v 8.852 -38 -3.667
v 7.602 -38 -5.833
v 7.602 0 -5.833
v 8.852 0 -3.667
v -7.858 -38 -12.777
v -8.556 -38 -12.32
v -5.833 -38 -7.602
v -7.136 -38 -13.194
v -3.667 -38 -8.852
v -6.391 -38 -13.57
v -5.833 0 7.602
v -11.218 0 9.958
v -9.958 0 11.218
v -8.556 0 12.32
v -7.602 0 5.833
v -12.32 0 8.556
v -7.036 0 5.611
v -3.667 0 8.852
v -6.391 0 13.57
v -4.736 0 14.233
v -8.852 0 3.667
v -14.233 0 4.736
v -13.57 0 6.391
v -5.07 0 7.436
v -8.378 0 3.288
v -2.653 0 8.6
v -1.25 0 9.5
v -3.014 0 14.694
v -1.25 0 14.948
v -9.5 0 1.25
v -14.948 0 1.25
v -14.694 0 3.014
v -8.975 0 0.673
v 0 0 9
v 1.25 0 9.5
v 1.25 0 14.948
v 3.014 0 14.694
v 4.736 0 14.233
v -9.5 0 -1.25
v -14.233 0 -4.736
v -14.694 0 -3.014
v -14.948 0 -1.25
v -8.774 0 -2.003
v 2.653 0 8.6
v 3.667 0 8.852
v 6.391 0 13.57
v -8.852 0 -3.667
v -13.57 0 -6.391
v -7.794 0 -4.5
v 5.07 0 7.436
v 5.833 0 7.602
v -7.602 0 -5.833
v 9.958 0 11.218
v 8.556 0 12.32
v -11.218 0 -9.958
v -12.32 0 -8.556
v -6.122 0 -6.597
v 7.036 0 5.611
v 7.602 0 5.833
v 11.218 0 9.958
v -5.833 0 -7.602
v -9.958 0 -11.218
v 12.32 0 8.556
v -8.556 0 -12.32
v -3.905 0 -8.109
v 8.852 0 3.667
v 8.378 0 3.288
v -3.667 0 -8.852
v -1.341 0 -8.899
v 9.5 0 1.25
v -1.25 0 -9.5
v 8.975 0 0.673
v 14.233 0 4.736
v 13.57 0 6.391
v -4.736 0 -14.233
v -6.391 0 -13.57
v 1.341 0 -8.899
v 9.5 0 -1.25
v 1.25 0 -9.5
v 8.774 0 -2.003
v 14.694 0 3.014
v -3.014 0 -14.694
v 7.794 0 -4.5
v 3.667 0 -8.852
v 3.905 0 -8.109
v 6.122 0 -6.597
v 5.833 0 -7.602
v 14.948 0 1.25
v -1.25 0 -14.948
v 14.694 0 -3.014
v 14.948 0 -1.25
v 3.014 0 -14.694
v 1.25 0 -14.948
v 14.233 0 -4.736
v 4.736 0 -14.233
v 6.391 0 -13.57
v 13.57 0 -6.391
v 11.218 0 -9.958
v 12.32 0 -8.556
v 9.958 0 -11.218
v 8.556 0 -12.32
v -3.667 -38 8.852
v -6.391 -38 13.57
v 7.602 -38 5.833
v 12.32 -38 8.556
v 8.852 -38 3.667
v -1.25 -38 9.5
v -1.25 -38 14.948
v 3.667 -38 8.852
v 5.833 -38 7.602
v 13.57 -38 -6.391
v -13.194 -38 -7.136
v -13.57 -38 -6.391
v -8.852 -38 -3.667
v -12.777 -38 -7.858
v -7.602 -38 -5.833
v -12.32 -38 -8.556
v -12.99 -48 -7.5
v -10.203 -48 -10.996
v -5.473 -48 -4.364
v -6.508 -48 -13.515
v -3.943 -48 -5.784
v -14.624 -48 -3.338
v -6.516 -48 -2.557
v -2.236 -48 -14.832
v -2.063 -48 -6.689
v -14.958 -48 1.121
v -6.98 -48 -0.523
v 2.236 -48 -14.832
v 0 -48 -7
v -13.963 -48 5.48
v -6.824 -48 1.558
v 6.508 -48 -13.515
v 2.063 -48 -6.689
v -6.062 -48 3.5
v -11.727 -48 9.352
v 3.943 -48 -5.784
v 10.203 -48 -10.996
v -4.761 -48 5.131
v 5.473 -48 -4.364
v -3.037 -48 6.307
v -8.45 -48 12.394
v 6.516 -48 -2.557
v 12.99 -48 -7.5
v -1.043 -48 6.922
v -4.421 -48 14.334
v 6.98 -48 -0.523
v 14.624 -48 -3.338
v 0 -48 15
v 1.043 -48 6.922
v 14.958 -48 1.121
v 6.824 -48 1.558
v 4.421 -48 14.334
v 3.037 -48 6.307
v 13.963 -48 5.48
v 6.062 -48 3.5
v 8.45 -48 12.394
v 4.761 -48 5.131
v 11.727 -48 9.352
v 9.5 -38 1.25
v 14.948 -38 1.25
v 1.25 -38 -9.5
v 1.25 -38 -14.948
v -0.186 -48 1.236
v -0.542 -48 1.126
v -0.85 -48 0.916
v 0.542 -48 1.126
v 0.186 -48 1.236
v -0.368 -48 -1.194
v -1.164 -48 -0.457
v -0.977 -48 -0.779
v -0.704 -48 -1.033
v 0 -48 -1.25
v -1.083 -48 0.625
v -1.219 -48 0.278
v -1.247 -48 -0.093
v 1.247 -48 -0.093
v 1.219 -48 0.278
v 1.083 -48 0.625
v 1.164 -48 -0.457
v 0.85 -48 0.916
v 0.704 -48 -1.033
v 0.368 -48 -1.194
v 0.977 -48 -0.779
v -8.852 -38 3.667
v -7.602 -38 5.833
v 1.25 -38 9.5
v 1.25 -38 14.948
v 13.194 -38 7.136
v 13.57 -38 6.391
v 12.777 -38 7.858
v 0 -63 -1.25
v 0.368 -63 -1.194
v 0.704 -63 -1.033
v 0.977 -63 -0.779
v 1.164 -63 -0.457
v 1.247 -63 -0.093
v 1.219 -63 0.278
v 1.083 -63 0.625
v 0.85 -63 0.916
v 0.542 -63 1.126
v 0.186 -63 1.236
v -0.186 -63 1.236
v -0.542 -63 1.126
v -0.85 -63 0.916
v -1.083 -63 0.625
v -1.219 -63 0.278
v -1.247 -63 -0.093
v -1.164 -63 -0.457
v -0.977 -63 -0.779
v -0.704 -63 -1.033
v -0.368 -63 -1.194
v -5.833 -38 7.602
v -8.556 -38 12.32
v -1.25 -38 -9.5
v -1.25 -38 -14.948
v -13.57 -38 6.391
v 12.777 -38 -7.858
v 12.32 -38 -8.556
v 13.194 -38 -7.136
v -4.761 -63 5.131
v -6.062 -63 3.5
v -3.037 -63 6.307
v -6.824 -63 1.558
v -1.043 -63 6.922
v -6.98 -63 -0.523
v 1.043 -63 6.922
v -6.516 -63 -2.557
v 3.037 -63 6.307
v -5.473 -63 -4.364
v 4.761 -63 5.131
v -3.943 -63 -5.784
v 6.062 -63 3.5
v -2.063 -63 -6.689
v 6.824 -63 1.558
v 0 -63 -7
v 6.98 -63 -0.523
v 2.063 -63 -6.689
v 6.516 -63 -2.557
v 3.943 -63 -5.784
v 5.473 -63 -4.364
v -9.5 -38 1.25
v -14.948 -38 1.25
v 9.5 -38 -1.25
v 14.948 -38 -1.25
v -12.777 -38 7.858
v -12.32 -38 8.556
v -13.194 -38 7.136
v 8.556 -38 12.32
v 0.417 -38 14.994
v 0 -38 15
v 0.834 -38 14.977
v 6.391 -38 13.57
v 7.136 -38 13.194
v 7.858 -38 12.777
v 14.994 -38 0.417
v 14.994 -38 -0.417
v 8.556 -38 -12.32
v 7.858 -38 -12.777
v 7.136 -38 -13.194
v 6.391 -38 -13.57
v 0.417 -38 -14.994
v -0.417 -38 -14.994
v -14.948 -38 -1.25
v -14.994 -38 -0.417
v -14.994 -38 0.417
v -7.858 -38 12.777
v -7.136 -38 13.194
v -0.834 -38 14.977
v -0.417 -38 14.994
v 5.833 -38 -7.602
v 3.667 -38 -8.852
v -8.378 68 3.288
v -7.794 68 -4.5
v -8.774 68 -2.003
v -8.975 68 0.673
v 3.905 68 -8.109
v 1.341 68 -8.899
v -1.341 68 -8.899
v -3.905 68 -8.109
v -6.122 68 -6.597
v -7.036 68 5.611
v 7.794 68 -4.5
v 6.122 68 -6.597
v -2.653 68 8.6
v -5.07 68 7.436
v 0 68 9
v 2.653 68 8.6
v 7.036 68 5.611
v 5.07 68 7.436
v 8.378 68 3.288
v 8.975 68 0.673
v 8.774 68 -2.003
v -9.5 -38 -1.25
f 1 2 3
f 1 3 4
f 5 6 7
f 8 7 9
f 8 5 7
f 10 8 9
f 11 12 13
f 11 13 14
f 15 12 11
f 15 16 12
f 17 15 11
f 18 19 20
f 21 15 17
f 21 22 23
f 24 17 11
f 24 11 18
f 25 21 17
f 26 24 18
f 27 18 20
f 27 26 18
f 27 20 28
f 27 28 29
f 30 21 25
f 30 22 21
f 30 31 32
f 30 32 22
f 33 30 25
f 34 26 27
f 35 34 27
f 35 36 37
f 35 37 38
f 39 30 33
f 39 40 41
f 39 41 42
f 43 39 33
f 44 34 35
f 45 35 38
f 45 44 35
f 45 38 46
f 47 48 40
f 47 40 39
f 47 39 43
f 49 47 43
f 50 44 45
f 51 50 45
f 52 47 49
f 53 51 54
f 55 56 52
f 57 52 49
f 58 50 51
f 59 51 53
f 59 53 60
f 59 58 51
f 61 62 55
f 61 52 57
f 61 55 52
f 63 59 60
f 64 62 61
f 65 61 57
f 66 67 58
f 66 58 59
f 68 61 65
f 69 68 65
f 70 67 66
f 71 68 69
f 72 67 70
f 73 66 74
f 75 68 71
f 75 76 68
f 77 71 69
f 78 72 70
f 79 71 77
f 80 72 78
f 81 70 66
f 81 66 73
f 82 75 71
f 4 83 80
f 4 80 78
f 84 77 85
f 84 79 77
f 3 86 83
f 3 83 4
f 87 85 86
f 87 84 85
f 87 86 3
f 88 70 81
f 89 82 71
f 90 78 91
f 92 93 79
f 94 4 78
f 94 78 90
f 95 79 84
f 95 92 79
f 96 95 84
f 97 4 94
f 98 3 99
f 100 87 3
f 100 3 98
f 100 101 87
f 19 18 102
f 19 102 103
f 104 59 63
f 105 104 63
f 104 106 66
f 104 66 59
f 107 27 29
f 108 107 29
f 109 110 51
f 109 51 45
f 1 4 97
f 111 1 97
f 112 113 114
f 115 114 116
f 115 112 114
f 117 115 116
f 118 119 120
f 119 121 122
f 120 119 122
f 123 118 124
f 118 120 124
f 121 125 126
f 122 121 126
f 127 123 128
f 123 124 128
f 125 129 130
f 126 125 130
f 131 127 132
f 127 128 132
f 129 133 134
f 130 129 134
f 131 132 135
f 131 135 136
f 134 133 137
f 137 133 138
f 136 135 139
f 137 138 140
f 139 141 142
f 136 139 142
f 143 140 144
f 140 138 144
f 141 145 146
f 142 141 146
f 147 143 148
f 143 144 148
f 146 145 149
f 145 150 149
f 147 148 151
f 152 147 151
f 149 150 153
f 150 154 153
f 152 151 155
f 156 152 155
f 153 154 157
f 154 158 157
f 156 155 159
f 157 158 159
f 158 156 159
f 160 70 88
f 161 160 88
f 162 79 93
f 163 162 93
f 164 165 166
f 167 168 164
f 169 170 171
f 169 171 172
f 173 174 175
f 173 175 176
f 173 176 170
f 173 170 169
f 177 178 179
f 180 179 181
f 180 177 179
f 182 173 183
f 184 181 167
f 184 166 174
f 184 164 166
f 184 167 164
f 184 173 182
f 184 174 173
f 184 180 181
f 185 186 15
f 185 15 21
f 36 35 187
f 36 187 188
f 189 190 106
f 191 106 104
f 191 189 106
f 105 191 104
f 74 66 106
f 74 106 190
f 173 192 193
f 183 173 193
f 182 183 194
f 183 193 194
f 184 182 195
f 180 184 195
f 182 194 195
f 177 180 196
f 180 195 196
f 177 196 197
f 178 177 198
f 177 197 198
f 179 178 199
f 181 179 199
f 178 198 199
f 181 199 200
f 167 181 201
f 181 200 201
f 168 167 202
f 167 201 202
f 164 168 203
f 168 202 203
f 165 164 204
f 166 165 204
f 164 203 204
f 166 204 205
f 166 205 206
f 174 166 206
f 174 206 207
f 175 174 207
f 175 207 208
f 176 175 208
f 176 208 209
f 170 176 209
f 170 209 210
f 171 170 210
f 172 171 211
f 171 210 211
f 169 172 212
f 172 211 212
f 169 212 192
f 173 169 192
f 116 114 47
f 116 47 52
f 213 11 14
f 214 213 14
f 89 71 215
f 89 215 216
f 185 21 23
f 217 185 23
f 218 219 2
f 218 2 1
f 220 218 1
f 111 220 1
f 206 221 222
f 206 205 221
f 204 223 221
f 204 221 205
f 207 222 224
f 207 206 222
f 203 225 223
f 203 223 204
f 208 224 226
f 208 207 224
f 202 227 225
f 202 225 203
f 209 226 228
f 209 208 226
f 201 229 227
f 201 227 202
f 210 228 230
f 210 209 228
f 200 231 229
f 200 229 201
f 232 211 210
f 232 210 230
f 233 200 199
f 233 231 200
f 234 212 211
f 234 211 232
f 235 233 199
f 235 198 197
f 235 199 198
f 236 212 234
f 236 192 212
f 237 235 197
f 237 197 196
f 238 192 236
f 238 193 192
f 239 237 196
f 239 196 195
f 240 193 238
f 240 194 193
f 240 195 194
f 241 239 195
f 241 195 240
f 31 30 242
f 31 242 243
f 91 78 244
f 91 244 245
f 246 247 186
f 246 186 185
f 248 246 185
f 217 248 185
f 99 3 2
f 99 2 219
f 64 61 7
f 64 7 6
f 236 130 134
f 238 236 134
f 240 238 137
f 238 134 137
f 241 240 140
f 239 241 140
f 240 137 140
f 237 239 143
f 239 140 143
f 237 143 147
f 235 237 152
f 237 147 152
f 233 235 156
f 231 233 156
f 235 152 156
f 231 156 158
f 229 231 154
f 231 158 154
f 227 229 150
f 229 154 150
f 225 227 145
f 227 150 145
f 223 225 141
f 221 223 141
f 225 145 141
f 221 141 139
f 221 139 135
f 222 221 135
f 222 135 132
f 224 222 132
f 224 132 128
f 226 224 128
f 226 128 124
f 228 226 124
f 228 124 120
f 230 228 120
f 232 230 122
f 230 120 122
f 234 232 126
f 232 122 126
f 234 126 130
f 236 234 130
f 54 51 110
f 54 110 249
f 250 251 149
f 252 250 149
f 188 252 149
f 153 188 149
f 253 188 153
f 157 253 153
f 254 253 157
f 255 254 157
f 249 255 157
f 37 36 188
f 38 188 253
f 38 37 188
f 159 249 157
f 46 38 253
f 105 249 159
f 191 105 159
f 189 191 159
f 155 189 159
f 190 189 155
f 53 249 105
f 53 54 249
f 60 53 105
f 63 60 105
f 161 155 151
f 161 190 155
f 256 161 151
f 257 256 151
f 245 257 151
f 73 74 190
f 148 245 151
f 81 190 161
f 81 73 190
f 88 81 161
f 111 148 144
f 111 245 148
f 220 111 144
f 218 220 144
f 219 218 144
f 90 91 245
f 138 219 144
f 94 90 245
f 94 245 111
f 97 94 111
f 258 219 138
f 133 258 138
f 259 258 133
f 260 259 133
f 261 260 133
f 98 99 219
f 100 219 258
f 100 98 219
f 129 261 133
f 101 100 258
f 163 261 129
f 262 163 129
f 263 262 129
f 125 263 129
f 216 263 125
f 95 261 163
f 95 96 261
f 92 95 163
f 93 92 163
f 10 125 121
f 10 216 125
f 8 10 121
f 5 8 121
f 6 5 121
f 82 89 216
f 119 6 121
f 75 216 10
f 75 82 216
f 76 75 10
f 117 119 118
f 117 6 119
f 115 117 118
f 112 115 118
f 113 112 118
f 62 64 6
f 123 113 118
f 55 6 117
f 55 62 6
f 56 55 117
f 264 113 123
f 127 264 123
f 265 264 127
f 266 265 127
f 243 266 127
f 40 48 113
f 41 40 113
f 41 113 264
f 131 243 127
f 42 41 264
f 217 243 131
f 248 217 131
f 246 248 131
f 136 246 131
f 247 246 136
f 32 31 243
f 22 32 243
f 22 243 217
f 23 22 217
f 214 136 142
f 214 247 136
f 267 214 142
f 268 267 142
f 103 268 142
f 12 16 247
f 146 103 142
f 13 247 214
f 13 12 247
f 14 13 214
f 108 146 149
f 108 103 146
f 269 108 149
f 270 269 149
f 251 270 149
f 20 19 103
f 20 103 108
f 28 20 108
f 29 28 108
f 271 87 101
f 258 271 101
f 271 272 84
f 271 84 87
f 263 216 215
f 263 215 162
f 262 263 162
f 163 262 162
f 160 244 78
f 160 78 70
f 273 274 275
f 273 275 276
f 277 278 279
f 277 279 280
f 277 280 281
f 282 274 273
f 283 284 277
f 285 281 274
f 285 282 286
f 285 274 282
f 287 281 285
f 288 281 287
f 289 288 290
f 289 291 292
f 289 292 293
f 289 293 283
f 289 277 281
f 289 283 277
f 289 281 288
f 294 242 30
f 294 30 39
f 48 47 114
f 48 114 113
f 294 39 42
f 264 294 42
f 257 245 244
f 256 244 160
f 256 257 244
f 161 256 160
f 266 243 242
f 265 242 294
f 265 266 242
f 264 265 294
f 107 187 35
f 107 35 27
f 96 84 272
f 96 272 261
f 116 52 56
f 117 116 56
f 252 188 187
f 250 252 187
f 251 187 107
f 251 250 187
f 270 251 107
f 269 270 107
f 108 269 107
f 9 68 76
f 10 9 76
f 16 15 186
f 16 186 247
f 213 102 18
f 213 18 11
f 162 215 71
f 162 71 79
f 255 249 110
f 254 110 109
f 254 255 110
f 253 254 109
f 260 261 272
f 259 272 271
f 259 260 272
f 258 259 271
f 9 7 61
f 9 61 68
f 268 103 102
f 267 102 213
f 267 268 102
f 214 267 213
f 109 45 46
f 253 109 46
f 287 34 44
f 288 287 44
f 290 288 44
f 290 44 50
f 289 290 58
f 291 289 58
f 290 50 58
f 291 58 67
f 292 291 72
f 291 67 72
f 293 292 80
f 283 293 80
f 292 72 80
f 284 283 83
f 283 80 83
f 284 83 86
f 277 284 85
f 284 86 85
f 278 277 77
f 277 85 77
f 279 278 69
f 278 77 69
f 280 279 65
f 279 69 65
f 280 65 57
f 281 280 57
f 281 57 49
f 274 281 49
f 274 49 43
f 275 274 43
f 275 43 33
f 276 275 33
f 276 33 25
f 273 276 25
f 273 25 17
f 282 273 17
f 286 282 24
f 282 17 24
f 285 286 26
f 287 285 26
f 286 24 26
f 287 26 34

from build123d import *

# Parameters (mm, degrees)
SKETCH1_R           = 15
SKETCH1_R_2         = 9
BOSS_EXTRUDE1_DEPTH = 48
SKETCH1_4_R         = 9
BOSS_EXTRUDE2_DEPTH = 68
SKETCH2_R           = 7
BOSS_EXTRUDE3_DEPTH = 15
SKETCH3_W           = 2.5
SKETCH3_H           = 6.210165372
CUT_EXTRUDE1_DEPTH  = 38
CIRPATTERN1_COUNT   = 12
SKETCH4_R           = 1.25
CUT_EXTRUDE2_DEPTH  = 15


with BuildPart() as part:
    # Sketch1 → Boss-Extrude1 (new body)
    # profile 1 of 2: a face of its own
    with BuildSketch(Plane(origin=(0, 0, 0), x_dir=(1, 0, 0), z_dir=(0, 1, 0))):
        with Locations(Location((0, 0, 0), (0, 0, 270))):
            Circle(SKETCH1_R)
        Circle(SKETCH1_R_2, mode=Mode.SUBTRACT)
    # profile 2 of 2: a face of its own
    with BuildSketch(Plane(origin=(0, 0, 0), x_dir=(1, 0, 0), z_dir=(0, 1, 0))):
        Circle(SKETCH1_R_2)
    extrude(amount=-BOSS_EXTRUDE1_DEPTH)

    # Sketch1<4> → Boss-Extrude2 (add)
    with BuildSketch(Plane(origin=(0, 0, 0), x_dir=(1, 0, 0), z_dir=(0, 1, 0))):
        with Locations(Location((0, 0, 0), (0, 0, 270))):
            Circle(SKETCH1_4_R)
    extrude(amount=BOSS_EXTRUDE2_DEPTH)

    # Sketch2 → Boss-Extrude3 (add)
    with BuildSketch(Plane.XZ.offset(48)):
        with Locations(Location((0, 0, 0), (0, 0, 270))):
            Circle(SKETCH2_R)
    extrude(amount=BOSS_EXTRUDE3_DEPTH)

    # Sketch3 → Cut-Extrude1 (cut)
    with BuildSketch(Plane(origin=(0, 0, 0), x_dir=(1, 0, 0), z_dir=(0, 1, 0))):
        with Locations((0, 12.605082686)):
            Rectangle(SKETCH3_W, SKETCH3_H)
    cut_extrude1 = extrude(amount=-CUT_EXTRUDE1_DEPTH, mode=Mode.SUBTRACT)

    # CirPattern1: Cut-Extrude1 ×12 about axis
    cirpattern1_axis = Axis((0, 0, 0), (0, 1, 0))
    for i in range(1, CIRPATTERN1_COUNT):
        add(cut_extrude1.rotate(cirpattern1_axis, i * 360 / CIRPATTERN1_COUNT), mode=Mode.SUBTRACT)

    # Sketch4 → Cut-Extrude2 (cut)
    with BuildSketch(Plane.XZ.offset(63)):
        with Locations(Location((0, 0, 0), (0, 0, 270))):
            Circle(SKETCH4_R)
    extrude(amount=-CUT_EXTRUDE2_DEPTH, mode=Mode.SUBTRACT)


solid = part.part
